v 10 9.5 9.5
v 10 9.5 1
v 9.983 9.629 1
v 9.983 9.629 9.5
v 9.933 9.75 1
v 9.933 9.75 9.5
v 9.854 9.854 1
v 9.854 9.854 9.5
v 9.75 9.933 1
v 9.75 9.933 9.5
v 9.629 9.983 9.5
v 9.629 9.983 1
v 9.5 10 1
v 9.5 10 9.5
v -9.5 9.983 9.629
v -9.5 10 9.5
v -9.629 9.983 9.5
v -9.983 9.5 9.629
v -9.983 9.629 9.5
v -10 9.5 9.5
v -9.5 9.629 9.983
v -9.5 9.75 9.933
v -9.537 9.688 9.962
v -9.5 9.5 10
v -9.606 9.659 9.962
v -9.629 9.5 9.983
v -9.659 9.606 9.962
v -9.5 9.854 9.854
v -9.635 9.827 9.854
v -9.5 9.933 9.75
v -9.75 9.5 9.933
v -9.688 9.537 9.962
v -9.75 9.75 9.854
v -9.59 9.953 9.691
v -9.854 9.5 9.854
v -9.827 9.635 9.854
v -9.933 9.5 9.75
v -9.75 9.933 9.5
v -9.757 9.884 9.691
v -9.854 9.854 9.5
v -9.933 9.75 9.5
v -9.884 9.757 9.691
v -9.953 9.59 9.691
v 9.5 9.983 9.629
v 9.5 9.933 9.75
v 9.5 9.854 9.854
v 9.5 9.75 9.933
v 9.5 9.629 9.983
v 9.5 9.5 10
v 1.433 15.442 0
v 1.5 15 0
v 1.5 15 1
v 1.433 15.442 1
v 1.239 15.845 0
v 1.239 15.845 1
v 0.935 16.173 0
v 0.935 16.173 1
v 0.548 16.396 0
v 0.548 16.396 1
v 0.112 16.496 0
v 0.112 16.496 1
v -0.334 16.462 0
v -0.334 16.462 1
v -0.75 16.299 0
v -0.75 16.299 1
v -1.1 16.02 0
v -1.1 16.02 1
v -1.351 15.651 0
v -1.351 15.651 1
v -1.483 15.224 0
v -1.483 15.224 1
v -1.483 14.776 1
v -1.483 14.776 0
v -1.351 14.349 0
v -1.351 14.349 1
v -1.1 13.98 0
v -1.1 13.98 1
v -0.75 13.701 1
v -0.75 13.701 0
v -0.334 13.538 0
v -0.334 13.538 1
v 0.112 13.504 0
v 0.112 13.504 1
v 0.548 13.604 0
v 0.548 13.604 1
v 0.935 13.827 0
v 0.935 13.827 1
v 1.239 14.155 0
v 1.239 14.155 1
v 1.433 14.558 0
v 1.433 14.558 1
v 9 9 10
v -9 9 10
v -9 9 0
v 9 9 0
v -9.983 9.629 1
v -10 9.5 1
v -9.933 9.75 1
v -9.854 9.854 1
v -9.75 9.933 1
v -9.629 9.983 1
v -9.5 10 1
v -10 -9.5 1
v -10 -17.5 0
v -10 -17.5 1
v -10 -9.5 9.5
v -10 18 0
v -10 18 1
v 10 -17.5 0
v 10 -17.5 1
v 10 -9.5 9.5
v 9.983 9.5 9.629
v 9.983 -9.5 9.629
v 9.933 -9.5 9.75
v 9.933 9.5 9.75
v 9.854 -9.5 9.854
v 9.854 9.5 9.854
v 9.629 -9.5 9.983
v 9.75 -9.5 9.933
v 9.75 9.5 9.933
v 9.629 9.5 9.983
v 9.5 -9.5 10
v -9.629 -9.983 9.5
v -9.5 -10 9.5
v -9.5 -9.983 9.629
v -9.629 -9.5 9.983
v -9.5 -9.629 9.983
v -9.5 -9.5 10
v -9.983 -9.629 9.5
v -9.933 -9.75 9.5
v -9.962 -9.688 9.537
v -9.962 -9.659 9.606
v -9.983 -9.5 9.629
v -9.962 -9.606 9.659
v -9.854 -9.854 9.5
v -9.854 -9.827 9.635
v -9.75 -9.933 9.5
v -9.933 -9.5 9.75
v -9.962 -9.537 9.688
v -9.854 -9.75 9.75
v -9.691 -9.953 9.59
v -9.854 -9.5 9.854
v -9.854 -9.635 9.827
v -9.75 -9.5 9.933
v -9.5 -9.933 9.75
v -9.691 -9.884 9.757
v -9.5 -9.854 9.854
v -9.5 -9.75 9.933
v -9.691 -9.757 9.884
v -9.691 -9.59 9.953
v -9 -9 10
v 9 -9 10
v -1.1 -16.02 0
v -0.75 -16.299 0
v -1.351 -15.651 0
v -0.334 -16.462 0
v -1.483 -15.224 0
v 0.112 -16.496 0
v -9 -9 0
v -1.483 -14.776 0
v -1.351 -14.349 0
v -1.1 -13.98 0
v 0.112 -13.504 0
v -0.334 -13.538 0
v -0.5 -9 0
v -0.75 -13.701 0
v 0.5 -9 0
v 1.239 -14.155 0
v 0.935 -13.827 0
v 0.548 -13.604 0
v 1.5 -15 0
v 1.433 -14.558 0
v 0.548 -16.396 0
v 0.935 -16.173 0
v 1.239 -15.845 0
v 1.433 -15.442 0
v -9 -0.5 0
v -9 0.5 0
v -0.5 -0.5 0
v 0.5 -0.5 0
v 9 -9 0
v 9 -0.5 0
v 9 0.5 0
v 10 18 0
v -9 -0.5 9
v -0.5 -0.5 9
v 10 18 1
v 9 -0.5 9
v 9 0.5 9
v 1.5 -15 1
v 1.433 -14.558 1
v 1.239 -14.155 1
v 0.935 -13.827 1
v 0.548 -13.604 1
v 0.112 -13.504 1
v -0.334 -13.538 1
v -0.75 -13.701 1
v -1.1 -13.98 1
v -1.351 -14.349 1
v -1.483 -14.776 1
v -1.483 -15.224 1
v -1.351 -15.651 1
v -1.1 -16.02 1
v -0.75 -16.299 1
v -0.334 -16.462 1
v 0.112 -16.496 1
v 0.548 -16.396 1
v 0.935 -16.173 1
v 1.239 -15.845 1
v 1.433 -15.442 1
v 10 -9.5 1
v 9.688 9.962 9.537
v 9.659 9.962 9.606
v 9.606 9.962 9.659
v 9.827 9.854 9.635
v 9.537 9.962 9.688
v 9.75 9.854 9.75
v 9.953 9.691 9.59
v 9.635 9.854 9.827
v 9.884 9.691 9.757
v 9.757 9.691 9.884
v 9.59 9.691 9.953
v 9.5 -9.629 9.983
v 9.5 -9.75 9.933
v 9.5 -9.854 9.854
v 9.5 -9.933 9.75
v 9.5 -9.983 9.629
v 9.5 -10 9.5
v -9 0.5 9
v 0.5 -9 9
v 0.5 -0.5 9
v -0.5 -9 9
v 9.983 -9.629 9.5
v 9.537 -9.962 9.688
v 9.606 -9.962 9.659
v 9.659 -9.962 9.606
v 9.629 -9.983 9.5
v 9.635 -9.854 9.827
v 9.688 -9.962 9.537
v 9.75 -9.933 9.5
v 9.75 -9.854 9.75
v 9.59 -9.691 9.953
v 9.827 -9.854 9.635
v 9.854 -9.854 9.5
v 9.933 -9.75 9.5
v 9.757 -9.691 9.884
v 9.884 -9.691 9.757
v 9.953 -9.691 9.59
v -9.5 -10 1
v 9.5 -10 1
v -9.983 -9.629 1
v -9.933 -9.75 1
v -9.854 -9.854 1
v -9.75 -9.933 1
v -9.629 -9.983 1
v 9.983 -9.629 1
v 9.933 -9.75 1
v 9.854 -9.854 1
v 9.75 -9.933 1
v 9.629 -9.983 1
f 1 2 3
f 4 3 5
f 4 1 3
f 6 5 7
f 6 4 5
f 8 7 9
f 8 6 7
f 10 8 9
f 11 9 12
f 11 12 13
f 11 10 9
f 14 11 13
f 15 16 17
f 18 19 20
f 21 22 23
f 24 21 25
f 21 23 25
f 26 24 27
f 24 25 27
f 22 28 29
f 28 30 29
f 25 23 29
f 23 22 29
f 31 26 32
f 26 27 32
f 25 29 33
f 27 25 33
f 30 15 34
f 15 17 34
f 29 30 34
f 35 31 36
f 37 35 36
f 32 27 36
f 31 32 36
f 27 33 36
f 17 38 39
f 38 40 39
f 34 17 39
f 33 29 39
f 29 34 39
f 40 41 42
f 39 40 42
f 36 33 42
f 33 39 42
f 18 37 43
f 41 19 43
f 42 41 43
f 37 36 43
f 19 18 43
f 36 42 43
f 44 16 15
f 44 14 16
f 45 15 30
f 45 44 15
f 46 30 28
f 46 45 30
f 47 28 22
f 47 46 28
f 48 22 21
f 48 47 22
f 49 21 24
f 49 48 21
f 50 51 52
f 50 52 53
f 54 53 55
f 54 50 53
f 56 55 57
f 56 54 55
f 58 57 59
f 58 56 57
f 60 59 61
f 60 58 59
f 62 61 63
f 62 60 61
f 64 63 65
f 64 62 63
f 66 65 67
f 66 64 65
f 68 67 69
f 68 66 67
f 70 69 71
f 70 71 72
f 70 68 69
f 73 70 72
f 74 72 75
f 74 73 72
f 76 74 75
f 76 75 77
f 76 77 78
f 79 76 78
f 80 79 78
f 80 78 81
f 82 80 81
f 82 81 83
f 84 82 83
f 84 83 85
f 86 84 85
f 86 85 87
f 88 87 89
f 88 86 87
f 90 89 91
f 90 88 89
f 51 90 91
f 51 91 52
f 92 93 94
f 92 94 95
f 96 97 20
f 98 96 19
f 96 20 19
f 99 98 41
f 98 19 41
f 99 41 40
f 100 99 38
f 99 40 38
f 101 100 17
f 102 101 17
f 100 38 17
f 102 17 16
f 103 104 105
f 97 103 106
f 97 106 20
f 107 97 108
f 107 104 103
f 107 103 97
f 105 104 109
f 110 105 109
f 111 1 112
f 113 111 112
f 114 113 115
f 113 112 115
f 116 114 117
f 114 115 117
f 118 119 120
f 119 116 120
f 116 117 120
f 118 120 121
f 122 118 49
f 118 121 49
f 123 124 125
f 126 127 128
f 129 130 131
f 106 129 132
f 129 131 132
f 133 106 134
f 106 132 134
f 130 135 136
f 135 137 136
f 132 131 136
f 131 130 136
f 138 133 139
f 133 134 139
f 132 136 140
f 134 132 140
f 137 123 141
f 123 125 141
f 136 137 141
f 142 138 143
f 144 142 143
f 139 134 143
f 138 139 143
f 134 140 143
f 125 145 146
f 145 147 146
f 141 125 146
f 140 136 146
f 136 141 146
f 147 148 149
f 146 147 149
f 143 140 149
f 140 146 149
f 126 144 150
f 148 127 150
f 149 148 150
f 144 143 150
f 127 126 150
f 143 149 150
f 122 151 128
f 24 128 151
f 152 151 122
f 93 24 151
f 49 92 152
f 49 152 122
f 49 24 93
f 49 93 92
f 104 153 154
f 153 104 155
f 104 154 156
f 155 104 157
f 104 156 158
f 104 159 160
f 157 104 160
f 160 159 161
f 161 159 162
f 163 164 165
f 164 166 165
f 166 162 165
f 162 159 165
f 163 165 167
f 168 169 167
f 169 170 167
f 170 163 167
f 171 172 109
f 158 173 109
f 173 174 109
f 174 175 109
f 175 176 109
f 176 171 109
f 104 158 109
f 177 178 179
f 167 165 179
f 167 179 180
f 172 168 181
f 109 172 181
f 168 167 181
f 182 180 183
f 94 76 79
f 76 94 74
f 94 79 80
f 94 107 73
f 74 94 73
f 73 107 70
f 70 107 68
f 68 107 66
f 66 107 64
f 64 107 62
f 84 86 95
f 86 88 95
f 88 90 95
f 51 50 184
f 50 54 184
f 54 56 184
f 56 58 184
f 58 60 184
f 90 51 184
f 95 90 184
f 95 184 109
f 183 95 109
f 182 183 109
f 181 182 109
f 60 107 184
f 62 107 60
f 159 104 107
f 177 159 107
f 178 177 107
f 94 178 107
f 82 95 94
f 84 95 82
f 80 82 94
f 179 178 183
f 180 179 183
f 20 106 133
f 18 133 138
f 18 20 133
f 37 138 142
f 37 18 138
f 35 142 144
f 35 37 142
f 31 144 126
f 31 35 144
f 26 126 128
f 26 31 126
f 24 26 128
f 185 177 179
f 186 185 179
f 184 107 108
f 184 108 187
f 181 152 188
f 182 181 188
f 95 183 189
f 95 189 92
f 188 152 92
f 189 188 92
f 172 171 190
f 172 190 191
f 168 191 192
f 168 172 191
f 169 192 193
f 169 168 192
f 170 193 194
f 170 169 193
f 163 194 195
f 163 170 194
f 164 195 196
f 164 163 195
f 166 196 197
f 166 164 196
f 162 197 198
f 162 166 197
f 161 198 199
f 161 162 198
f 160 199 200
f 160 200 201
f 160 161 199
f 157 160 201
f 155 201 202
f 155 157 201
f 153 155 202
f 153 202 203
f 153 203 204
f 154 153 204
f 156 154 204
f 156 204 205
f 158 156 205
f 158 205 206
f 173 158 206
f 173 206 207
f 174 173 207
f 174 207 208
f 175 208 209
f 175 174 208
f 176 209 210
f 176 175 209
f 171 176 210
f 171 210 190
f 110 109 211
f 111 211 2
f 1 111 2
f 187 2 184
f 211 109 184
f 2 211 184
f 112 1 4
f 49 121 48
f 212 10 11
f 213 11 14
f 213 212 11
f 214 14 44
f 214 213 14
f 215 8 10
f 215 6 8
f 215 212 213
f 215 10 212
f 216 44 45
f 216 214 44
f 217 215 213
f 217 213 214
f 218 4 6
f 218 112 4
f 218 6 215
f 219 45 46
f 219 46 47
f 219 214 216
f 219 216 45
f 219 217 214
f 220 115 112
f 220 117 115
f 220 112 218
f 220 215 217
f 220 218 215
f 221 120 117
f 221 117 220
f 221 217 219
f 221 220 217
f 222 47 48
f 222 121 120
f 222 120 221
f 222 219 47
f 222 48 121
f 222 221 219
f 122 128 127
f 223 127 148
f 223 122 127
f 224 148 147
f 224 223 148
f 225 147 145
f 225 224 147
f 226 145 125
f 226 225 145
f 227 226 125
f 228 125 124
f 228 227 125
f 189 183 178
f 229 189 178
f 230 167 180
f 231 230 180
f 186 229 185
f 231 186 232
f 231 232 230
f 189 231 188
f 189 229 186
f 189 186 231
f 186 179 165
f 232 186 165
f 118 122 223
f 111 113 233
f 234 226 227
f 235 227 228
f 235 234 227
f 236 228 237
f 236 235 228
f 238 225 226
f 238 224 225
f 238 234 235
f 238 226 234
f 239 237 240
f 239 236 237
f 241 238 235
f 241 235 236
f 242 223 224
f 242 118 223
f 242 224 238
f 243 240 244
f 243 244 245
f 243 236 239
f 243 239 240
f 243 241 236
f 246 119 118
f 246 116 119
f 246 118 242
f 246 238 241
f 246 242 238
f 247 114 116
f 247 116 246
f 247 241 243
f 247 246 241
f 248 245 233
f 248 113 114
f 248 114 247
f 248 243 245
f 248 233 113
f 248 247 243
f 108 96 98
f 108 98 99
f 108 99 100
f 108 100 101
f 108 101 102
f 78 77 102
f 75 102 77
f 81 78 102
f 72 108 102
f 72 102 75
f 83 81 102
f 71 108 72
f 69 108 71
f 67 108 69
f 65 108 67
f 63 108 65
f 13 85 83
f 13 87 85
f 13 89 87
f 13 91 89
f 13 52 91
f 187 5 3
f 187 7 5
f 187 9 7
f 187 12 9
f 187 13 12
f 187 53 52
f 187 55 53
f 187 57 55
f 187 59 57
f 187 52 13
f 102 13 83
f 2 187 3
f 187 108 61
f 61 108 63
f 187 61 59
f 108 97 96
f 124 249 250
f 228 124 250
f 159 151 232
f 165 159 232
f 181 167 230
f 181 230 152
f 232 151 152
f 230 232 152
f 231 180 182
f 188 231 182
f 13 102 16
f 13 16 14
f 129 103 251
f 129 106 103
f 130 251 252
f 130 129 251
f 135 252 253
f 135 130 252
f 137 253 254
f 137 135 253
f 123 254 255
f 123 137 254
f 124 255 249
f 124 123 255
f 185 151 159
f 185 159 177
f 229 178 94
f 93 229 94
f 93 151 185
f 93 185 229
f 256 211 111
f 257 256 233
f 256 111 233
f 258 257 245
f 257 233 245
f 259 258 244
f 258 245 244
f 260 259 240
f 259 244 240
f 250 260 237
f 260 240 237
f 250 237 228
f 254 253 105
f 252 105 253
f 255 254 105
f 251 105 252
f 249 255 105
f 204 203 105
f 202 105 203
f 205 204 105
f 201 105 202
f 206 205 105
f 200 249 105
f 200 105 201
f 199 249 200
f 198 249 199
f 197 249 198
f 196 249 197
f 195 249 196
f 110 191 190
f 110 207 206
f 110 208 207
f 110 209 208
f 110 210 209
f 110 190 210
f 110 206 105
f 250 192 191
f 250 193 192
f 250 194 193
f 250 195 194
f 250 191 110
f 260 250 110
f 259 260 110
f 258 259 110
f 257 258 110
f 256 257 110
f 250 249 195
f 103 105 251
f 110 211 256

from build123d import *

# Parameters (mm, degrees)
F0_W     = 20
F0_H     = 20
F1_DEPTH = 10
F2_T     = -1
F4_DEPTH = 9
F5_W     = 20
F5_H     = 8
F5_R     = 1.5
F6_DEPTH = 1
F7_W     = 18
F7_H     = 18
F8_DEPTH = 1
F9_R     = 0.5


with BuildPart() as f1:
    # F0 (on Top) → F1 (new body)
    with BuildSketch(Plane.XY):
        Rectangle(F0_W, F0_H)
    extrude(amount=F1_DEPTH)

    # F2
    f2_openings = [f1.faces().sort_by_distance(p)[0] for p in [
        (0, 0, 0),
    ]]
    offset(amount=F2_T, openings=f2_openings)

    # F3 (on Top) → F4 (join)
    with BuildSketch(Plane.XY):
        Polygon((-0.5, -9), (0.5, -9), (0.5, -0.5), (9, -0.5), (9, 0.5), (0.5, 0.5), (-0.5, 0.5), (-9, 0.5), (-9, -0.5), (-0.5, -0.5), align=None)
    extrude(amount=F4_DEPTH)

    # F5 (on Top) → F6 (join)
    with BuildSketch(Plane.XY):
        with Locations((0, -13.5)):
            Rectangle(F5_W, F5_H)
        with Locations((0, -15)):
            Circle(F5_R, mode=Mode.SUBTRACT)
        with Locations((0, 14)):
            Rectangle(F5_W, F5_H)
        with Locations((0, 15)):
            Circle(F5_R, mode=Mode.SUBTRACT)
    extrude(amount=F6_DEPTH)

    # F7 (on face) → F8 (cut)
    with BuildSketch(Plane.XY.offset(10)):
        Rectangle(F7_W, F7_H)
    extrude(amount=-F8_DEPTH, mode=Mode.SUBTRACT)

    # F9
    f9_edges = [f1.edges().sort_by_distance(p)[0] for p in [
        (10, 0, 10),
        (0, -10, 10),
        (10, -10, 5.5),
        (-10, -10, 5.5),
        (10, 10, 5.5),
        (-10, 10, 5.5),
        (0, 10, 10),
        (-10, 0, 10),
    ]]
    fillet(f9_edges, radius=F9_R)


solid = f1.part
